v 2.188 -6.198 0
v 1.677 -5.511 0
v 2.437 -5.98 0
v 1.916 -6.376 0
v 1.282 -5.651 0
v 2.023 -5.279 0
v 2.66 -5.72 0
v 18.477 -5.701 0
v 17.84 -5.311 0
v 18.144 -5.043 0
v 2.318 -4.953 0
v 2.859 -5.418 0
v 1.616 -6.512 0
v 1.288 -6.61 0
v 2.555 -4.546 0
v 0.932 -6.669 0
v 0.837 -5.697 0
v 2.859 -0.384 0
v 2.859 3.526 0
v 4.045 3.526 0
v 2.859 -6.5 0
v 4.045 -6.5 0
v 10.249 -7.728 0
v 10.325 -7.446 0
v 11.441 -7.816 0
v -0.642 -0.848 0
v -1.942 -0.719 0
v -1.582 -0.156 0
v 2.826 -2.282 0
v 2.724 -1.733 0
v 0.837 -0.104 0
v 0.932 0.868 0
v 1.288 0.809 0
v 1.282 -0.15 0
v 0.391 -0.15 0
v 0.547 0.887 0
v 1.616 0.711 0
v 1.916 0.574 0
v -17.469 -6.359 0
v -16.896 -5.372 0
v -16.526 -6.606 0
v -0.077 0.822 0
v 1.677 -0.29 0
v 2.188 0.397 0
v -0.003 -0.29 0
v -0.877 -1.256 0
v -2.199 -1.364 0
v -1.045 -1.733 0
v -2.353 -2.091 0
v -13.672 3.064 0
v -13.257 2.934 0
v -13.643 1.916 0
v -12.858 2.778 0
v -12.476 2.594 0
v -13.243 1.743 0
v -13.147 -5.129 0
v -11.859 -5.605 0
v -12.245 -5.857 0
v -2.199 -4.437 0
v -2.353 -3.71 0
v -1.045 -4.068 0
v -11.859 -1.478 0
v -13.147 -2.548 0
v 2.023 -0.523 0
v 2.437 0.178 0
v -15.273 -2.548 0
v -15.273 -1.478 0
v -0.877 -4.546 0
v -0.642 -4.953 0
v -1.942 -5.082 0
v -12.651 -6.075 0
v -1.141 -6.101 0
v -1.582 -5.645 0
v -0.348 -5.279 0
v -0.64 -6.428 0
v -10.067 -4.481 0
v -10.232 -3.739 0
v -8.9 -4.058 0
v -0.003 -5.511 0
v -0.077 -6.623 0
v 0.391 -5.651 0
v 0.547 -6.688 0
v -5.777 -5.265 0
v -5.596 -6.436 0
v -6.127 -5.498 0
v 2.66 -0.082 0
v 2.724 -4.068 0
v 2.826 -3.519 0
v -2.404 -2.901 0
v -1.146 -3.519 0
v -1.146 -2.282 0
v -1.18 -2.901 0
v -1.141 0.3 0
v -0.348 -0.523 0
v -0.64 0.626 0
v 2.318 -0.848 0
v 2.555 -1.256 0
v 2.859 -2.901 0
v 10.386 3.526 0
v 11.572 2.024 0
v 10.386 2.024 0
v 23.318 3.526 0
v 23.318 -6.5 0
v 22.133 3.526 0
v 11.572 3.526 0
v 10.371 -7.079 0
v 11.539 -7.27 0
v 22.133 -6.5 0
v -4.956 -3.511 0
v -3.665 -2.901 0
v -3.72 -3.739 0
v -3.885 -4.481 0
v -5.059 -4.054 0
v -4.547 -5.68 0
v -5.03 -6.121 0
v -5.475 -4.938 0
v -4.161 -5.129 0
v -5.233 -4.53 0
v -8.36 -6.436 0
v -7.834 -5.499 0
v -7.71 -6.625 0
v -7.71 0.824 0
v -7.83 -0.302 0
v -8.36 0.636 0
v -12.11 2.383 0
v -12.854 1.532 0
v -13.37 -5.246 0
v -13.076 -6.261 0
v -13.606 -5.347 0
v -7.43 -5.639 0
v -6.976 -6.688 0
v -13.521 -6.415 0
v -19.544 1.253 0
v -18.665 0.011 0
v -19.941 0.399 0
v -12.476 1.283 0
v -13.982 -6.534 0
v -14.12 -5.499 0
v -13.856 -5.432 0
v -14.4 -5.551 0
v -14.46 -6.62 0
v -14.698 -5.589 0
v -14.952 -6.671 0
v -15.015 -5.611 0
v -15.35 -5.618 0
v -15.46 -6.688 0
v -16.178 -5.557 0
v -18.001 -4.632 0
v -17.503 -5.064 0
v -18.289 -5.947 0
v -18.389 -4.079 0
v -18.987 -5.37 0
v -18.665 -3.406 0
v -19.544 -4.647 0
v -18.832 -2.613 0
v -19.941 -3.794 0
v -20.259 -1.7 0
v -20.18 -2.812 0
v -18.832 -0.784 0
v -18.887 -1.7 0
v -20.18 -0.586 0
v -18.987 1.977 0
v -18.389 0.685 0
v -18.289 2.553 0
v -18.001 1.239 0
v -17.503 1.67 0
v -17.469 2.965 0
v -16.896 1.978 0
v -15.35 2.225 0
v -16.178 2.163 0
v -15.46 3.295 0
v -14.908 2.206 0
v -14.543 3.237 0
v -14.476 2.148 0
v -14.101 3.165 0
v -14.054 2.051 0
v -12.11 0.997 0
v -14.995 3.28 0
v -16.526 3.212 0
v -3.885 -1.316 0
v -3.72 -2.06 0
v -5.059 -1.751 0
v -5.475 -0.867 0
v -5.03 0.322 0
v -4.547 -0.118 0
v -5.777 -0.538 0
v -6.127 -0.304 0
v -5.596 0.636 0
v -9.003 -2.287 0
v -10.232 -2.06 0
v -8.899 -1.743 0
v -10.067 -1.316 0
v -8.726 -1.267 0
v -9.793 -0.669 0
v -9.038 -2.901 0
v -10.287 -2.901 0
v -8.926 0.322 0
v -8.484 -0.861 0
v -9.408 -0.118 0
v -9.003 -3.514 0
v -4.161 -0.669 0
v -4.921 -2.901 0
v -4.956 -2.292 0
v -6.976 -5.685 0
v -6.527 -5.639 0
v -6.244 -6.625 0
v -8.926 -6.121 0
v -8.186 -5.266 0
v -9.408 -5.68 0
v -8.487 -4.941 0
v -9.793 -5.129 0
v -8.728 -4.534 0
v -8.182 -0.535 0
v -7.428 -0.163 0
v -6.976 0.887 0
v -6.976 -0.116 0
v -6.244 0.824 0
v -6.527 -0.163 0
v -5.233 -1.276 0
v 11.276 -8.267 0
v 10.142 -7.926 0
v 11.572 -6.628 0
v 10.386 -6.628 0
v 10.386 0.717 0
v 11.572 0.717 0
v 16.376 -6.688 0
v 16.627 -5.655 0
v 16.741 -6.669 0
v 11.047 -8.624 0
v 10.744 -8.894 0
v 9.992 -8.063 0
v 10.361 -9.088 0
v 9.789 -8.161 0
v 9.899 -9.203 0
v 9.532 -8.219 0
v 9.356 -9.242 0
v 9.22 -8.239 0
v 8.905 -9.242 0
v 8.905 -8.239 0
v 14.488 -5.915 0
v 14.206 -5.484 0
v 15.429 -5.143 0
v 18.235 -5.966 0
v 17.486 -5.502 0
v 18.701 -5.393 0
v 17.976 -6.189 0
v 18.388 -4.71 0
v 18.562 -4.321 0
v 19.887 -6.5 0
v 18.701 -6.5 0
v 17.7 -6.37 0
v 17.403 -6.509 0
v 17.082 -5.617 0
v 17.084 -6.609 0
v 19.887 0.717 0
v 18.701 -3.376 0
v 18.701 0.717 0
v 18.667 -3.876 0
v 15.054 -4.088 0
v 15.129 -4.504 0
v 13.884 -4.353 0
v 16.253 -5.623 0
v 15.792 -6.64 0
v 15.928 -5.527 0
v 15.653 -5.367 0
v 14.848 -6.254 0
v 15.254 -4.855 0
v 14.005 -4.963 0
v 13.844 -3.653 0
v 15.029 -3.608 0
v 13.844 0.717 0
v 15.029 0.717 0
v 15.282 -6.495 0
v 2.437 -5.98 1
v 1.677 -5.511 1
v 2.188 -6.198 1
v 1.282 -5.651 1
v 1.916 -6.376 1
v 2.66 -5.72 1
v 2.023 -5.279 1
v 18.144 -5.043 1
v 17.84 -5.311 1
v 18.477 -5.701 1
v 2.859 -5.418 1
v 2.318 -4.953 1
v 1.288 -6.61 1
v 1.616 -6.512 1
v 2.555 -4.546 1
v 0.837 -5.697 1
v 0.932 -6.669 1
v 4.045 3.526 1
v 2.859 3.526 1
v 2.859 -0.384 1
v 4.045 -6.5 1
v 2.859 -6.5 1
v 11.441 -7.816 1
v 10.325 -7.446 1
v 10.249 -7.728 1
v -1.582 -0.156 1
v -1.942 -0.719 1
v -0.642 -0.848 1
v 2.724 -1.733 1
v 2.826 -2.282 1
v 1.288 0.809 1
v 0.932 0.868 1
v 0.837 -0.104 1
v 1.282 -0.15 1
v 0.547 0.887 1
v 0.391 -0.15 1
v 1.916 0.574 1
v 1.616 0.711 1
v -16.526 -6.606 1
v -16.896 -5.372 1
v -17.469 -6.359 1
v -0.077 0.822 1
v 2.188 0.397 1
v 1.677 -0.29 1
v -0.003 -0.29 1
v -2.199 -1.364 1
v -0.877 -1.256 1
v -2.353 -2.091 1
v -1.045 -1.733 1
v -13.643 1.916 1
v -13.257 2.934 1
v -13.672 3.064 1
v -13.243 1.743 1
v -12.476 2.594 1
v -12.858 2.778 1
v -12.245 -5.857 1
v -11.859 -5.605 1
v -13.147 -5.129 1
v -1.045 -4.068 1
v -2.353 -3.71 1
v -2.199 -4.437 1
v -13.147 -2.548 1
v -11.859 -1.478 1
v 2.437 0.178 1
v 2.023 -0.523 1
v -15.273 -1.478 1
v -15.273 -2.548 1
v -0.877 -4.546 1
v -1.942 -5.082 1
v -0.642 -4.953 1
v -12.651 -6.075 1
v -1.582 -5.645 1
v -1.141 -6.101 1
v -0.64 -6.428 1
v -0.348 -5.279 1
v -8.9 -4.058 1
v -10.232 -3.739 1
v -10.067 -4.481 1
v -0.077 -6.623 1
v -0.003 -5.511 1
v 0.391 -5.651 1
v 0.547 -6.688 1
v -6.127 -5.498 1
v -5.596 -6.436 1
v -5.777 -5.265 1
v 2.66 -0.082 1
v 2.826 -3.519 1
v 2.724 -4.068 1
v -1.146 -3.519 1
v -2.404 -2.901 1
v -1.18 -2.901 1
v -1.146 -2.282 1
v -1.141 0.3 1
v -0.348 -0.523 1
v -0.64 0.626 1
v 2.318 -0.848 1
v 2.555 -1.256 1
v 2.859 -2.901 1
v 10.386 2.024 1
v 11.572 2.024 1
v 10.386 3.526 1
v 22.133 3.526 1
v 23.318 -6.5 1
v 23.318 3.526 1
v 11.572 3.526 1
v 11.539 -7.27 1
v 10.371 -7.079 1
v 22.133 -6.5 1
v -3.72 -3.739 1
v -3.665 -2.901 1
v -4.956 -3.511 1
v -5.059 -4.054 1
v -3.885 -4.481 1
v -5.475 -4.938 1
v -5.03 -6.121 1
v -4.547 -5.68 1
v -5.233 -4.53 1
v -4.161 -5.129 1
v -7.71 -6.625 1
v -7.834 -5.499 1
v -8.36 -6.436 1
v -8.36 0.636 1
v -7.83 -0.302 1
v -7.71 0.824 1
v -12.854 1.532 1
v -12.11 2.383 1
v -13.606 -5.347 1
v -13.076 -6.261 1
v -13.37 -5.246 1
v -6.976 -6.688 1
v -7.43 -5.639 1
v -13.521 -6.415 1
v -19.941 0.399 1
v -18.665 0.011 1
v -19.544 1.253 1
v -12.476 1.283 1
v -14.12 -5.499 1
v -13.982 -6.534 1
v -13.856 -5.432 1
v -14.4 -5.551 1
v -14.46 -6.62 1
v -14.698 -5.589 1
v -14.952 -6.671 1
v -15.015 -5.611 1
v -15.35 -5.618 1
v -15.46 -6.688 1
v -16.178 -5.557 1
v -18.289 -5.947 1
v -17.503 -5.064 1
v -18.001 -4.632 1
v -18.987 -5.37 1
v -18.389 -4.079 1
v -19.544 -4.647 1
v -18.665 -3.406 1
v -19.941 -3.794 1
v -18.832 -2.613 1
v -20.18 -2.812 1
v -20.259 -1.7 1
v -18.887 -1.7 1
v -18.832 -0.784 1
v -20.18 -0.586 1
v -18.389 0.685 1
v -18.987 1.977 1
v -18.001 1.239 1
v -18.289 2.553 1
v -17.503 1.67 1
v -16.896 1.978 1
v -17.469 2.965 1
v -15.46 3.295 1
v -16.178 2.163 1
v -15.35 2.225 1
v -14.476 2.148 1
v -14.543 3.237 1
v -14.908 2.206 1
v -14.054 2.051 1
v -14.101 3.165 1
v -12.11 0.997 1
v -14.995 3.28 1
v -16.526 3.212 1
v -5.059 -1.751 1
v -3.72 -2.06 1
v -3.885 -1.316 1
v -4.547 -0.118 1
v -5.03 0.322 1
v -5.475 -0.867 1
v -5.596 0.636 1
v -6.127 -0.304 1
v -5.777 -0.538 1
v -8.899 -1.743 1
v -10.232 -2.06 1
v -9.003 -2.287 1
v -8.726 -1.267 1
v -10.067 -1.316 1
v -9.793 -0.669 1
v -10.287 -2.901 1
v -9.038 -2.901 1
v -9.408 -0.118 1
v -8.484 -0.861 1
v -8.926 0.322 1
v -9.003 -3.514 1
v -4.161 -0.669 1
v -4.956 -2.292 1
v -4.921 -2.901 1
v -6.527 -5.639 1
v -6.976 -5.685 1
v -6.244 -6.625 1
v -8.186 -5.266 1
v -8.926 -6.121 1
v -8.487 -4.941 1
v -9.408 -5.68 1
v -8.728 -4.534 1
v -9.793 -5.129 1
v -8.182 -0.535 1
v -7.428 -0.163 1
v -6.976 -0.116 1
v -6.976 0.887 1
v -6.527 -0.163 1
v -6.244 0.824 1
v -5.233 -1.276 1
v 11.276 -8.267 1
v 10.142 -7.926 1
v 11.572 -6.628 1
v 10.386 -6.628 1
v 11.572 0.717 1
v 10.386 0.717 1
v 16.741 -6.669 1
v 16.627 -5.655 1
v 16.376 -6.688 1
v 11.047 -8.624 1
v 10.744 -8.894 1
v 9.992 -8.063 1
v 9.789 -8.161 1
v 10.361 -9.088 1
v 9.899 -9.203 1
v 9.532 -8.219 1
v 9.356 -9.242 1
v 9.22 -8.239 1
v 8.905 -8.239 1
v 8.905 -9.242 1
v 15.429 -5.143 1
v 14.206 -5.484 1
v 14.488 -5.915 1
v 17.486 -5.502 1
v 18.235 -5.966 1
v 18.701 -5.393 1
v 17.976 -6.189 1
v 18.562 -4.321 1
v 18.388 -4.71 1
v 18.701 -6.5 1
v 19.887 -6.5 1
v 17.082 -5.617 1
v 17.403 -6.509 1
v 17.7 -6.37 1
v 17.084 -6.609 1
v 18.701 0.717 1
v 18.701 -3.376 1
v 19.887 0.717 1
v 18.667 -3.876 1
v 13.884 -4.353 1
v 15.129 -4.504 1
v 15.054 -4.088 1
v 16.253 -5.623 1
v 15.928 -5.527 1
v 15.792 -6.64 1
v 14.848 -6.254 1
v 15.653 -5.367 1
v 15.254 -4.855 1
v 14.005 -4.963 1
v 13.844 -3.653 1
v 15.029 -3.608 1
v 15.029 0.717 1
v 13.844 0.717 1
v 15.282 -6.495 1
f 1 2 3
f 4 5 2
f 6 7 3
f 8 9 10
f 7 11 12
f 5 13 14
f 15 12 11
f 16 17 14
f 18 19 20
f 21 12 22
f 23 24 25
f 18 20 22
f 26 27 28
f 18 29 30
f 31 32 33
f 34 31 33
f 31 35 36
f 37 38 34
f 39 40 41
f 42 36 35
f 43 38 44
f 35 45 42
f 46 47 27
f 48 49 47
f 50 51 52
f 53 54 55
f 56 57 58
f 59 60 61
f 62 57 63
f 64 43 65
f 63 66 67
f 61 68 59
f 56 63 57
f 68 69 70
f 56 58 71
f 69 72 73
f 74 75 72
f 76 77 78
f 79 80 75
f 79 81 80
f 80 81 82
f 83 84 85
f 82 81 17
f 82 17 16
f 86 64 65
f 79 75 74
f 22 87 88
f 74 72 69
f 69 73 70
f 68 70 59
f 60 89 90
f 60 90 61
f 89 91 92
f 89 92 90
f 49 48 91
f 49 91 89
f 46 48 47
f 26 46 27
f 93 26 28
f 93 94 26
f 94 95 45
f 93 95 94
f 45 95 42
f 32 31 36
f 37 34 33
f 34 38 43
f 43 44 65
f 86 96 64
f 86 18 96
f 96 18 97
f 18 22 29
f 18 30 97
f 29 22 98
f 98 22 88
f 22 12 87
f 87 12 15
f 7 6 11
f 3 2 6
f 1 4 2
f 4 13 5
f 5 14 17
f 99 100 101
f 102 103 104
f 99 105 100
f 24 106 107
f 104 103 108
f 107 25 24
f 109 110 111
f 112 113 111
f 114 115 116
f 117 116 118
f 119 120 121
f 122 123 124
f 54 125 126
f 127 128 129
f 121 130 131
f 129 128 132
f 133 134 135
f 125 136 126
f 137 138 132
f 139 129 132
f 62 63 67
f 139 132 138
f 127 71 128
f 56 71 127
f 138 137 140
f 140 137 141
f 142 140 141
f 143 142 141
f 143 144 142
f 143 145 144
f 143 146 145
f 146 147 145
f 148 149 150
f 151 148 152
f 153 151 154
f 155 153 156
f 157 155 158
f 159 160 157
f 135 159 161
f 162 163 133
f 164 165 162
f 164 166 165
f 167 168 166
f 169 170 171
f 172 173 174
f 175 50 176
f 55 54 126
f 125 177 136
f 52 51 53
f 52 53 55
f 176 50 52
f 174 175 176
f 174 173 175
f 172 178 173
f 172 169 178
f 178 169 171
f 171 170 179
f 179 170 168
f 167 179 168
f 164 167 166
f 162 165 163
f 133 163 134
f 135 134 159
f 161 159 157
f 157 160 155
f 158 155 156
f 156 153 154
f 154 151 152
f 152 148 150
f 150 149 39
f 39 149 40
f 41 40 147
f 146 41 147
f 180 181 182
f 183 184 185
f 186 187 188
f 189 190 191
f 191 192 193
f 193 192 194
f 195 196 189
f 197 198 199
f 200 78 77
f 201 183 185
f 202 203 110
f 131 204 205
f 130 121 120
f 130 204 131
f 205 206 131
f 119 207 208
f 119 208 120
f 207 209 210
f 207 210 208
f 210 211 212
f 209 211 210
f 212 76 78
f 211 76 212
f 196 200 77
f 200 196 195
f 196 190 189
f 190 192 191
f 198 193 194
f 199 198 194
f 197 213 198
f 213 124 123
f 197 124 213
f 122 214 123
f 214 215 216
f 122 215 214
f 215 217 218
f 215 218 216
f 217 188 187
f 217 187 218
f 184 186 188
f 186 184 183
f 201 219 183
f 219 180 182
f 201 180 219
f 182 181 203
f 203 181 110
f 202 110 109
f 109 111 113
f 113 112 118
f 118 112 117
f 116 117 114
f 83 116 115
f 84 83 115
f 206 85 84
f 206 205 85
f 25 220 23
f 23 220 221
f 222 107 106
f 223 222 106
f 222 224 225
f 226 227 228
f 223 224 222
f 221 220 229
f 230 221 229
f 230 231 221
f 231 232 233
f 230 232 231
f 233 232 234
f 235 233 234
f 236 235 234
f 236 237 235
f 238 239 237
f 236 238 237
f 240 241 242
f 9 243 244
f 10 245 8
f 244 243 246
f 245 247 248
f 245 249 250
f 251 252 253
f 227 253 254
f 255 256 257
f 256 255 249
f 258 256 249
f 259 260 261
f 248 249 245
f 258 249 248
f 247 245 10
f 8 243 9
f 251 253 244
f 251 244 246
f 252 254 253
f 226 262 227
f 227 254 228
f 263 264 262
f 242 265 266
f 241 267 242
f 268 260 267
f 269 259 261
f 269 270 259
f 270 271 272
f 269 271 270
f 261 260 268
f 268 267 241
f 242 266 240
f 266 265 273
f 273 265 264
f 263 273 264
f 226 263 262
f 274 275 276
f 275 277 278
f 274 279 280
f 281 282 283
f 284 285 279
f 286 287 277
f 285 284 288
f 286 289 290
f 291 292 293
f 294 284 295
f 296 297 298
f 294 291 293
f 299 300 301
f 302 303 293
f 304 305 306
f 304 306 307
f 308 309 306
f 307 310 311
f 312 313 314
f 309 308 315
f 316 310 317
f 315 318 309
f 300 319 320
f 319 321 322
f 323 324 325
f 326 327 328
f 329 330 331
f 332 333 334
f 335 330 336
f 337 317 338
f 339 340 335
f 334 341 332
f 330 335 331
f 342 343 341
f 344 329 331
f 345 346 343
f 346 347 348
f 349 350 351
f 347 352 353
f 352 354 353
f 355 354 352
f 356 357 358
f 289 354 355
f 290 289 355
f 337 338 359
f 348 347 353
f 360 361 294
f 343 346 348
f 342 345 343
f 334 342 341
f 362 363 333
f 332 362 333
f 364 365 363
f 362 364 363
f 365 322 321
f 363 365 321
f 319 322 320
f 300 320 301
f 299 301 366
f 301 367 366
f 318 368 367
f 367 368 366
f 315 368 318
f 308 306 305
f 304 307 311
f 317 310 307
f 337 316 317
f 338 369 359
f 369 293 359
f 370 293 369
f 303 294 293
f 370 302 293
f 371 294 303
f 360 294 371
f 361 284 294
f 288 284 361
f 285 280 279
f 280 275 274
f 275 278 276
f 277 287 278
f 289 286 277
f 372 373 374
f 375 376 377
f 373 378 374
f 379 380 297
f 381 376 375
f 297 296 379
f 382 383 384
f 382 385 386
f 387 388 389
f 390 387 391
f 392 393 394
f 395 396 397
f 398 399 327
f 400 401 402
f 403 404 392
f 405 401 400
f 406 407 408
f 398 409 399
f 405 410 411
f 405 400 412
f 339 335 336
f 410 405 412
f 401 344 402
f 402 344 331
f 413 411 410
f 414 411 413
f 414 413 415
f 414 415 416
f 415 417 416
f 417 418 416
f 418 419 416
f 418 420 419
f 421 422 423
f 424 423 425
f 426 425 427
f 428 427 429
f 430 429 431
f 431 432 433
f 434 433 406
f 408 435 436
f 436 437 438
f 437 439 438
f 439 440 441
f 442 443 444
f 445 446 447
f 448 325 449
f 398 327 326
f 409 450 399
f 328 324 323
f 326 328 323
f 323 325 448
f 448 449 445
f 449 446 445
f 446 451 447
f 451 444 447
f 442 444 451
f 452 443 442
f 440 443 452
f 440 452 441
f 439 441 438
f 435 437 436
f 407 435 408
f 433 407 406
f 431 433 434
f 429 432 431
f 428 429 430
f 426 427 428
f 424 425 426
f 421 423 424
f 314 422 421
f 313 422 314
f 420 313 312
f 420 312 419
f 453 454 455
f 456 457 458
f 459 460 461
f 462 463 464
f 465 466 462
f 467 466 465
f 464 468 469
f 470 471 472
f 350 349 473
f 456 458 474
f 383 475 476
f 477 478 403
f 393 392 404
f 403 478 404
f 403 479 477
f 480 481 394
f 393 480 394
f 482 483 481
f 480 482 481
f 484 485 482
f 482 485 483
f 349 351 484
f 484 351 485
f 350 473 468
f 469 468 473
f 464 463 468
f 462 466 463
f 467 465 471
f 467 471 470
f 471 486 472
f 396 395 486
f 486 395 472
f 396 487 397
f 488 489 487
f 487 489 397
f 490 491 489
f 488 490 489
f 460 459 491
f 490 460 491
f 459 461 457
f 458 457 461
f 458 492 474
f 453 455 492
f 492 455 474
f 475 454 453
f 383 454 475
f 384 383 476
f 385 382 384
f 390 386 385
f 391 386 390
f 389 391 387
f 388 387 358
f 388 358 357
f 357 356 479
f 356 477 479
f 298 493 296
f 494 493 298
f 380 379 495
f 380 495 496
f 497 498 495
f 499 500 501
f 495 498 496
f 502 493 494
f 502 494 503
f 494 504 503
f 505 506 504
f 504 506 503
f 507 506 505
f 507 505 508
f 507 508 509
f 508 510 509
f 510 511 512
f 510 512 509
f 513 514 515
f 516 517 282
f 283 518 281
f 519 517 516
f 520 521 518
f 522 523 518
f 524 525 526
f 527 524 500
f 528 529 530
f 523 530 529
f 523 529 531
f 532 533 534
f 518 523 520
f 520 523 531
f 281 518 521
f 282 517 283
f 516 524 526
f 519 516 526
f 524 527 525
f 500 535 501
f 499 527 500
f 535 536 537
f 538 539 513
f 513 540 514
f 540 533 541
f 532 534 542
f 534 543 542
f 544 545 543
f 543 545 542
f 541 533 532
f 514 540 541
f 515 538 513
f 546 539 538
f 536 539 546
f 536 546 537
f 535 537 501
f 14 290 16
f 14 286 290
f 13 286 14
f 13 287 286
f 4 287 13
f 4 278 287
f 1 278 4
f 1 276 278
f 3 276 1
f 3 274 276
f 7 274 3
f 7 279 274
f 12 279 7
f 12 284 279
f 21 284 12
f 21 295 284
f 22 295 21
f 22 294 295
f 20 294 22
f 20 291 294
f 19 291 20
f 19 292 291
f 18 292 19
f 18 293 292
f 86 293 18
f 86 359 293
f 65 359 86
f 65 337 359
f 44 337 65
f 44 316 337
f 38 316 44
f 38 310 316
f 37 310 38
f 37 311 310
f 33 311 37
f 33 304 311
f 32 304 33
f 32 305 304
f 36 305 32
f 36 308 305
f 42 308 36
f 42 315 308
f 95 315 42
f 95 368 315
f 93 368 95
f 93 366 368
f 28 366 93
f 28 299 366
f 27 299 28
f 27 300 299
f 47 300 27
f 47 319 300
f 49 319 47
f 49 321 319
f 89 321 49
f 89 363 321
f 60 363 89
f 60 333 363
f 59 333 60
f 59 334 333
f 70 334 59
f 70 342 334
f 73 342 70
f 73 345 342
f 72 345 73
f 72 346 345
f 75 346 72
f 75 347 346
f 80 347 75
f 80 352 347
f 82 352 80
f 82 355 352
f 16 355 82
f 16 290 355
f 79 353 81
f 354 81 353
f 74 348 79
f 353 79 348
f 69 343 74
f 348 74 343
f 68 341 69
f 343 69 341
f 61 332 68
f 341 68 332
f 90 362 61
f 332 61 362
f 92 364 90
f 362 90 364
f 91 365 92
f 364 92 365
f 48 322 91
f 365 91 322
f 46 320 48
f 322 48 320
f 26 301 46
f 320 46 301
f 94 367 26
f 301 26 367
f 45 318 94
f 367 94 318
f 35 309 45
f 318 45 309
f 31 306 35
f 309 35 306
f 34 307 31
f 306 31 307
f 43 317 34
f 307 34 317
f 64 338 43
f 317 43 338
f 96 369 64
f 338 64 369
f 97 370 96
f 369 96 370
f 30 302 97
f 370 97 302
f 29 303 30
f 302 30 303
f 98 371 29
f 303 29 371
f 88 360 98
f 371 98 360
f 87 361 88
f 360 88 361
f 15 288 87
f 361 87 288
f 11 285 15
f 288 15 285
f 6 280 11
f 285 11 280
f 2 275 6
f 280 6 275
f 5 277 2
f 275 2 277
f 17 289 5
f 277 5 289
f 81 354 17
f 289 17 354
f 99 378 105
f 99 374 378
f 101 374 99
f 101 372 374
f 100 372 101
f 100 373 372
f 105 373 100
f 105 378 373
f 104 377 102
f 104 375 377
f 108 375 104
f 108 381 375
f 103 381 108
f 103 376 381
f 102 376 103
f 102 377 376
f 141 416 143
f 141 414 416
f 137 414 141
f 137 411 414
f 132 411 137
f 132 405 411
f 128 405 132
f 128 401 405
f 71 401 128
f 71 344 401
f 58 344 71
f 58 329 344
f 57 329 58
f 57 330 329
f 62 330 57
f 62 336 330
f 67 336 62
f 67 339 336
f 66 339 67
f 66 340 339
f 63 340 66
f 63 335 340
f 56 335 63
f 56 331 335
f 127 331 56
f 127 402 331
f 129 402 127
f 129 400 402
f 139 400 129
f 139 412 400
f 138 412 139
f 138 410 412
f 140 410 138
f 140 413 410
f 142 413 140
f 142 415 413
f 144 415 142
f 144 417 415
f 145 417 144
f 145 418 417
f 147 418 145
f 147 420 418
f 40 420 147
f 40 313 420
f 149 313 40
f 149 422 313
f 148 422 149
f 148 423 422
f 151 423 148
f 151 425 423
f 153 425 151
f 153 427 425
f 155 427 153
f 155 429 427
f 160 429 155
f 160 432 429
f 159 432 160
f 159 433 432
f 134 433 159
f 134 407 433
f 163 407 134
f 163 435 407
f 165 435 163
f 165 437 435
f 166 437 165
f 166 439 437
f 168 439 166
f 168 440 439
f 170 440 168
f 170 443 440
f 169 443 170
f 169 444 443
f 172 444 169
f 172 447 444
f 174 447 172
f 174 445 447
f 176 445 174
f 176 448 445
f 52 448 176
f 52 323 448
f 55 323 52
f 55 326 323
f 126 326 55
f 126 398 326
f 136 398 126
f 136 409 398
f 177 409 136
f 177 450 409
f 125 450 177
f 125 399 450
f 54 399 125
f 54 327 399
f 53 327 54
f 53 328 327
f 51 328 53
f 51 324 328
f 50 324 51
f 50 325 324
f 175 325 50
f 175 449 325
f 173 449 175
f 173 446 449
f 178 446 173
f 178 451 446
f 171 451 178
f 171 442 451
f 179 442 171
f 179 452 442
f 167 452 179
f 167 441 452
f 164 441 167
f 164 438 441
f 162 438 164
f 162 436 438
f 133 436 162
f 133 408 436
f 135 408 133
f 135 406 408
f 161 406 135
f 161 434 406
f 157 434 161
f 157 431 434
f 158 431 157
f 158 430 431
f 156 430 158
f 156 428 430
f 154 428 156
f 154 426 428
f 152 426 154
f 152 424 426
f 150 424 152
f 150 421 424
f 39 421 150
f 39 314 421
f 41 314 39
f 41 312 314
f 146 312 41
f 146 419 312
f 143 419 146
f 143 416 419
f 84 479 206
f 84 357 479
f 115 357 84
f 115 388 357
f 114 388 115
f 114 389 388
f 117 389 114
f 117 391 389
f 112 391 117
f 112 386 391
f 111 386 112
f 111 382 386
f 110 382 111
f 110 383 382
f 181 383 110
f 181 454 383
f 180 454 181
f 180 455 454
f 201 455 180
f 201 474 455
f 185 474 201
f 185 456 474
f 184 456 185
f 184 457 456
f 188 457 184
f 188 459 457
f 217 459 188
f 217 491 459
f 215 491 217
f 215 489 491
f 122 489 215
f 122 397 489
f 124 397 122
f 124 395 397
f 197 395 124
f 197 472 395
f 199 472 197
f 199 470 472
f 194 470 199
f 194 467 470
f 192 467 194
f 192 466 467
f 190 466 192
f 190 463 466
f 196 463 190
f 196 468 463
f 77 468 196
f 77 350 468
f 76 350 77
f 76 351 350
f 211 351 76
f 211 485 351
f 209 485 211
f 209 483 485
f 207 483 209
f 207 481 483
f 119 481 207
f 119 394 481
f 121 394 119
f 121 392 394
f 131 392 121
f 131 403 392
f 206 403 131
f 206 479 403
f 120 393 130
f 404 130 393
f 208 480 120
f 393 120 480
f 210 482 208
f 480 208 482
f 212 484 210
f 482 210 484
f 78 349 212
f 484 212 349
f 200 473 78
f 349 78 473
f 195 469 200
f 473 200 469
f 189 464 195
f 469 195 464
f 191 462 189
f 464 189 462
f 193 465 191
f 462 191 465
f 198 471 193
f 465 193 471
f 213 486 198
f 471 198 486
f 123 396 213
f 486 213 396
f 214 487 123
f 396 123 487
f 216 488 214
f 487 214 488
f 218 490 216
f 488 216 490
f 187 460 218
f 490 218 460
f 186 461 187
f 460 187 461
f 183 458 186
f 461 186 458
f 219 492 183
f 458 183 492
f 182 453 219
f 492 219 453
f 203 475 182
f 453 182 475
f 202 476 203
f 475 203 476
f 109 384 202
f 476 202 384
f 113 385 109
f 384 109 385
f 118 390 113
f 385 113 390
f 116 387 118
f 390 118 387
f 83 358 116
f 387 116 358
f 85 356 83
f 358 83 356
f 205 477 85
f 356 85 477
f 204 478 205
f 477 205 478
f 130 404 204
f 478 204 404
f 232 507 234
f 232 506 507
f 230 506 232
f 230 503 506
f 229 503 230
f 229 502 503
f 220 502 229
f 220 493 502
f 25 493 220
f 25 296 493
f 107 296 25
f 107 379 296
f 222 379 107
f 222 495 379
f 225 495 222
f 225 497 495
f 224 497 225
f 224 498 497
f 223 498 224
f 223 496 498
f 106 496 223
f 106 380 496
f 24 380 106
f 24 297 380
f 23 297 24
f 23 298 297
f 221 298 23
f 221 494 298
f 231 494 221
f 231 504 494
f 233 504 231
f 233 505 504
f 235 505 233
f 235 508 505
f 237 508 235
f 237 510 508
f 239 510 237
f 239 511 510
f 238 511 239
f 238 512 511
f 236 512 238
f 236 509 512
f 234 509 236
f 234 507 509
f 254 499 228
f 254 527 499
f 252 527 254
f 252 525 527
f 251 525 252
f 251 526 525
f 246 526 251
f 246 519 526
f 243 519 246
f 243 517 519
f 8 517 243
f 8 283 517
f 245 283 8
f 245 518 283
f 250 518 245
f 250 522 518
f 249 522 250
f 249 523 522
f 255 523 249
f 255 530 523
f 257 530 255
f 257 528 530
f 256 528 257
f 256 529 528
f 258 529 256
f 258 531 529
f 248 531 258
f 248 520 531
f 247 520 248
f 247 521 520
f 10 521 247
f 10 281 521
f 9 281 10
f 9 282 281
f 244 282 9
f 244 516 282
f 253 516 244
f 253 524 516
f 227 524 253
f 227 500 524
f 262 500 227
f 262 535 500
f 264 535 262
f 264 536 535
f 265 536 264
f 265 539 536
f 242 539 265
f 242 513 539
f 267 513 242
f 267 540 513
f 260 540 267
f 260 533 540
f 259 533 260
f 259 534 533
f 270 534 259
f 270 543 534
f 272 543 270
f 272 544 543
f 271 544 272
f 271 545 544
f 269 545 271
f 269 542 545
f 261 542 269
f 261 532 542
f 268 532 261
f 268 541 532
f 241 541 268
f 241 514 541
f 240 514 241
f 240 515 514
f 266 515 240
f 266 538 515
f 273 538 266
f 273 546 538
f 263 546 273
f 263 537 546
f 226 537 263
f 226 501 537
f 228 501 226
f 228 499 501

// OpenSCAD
fontface="Apple Chancery";
//fontface="Savoye LET";
//fontface="Zapfino";
fontsize=9.5;
test=false;

if (test) {
    width=44;
    translate([-width/2,fontsize*1.5])
        cube([width,2,1]);
}
linear_extrude(1) {
    translate([-21,-6.5]) {
        text("God jul", font=fontface, size=fontsize);
    }
}
